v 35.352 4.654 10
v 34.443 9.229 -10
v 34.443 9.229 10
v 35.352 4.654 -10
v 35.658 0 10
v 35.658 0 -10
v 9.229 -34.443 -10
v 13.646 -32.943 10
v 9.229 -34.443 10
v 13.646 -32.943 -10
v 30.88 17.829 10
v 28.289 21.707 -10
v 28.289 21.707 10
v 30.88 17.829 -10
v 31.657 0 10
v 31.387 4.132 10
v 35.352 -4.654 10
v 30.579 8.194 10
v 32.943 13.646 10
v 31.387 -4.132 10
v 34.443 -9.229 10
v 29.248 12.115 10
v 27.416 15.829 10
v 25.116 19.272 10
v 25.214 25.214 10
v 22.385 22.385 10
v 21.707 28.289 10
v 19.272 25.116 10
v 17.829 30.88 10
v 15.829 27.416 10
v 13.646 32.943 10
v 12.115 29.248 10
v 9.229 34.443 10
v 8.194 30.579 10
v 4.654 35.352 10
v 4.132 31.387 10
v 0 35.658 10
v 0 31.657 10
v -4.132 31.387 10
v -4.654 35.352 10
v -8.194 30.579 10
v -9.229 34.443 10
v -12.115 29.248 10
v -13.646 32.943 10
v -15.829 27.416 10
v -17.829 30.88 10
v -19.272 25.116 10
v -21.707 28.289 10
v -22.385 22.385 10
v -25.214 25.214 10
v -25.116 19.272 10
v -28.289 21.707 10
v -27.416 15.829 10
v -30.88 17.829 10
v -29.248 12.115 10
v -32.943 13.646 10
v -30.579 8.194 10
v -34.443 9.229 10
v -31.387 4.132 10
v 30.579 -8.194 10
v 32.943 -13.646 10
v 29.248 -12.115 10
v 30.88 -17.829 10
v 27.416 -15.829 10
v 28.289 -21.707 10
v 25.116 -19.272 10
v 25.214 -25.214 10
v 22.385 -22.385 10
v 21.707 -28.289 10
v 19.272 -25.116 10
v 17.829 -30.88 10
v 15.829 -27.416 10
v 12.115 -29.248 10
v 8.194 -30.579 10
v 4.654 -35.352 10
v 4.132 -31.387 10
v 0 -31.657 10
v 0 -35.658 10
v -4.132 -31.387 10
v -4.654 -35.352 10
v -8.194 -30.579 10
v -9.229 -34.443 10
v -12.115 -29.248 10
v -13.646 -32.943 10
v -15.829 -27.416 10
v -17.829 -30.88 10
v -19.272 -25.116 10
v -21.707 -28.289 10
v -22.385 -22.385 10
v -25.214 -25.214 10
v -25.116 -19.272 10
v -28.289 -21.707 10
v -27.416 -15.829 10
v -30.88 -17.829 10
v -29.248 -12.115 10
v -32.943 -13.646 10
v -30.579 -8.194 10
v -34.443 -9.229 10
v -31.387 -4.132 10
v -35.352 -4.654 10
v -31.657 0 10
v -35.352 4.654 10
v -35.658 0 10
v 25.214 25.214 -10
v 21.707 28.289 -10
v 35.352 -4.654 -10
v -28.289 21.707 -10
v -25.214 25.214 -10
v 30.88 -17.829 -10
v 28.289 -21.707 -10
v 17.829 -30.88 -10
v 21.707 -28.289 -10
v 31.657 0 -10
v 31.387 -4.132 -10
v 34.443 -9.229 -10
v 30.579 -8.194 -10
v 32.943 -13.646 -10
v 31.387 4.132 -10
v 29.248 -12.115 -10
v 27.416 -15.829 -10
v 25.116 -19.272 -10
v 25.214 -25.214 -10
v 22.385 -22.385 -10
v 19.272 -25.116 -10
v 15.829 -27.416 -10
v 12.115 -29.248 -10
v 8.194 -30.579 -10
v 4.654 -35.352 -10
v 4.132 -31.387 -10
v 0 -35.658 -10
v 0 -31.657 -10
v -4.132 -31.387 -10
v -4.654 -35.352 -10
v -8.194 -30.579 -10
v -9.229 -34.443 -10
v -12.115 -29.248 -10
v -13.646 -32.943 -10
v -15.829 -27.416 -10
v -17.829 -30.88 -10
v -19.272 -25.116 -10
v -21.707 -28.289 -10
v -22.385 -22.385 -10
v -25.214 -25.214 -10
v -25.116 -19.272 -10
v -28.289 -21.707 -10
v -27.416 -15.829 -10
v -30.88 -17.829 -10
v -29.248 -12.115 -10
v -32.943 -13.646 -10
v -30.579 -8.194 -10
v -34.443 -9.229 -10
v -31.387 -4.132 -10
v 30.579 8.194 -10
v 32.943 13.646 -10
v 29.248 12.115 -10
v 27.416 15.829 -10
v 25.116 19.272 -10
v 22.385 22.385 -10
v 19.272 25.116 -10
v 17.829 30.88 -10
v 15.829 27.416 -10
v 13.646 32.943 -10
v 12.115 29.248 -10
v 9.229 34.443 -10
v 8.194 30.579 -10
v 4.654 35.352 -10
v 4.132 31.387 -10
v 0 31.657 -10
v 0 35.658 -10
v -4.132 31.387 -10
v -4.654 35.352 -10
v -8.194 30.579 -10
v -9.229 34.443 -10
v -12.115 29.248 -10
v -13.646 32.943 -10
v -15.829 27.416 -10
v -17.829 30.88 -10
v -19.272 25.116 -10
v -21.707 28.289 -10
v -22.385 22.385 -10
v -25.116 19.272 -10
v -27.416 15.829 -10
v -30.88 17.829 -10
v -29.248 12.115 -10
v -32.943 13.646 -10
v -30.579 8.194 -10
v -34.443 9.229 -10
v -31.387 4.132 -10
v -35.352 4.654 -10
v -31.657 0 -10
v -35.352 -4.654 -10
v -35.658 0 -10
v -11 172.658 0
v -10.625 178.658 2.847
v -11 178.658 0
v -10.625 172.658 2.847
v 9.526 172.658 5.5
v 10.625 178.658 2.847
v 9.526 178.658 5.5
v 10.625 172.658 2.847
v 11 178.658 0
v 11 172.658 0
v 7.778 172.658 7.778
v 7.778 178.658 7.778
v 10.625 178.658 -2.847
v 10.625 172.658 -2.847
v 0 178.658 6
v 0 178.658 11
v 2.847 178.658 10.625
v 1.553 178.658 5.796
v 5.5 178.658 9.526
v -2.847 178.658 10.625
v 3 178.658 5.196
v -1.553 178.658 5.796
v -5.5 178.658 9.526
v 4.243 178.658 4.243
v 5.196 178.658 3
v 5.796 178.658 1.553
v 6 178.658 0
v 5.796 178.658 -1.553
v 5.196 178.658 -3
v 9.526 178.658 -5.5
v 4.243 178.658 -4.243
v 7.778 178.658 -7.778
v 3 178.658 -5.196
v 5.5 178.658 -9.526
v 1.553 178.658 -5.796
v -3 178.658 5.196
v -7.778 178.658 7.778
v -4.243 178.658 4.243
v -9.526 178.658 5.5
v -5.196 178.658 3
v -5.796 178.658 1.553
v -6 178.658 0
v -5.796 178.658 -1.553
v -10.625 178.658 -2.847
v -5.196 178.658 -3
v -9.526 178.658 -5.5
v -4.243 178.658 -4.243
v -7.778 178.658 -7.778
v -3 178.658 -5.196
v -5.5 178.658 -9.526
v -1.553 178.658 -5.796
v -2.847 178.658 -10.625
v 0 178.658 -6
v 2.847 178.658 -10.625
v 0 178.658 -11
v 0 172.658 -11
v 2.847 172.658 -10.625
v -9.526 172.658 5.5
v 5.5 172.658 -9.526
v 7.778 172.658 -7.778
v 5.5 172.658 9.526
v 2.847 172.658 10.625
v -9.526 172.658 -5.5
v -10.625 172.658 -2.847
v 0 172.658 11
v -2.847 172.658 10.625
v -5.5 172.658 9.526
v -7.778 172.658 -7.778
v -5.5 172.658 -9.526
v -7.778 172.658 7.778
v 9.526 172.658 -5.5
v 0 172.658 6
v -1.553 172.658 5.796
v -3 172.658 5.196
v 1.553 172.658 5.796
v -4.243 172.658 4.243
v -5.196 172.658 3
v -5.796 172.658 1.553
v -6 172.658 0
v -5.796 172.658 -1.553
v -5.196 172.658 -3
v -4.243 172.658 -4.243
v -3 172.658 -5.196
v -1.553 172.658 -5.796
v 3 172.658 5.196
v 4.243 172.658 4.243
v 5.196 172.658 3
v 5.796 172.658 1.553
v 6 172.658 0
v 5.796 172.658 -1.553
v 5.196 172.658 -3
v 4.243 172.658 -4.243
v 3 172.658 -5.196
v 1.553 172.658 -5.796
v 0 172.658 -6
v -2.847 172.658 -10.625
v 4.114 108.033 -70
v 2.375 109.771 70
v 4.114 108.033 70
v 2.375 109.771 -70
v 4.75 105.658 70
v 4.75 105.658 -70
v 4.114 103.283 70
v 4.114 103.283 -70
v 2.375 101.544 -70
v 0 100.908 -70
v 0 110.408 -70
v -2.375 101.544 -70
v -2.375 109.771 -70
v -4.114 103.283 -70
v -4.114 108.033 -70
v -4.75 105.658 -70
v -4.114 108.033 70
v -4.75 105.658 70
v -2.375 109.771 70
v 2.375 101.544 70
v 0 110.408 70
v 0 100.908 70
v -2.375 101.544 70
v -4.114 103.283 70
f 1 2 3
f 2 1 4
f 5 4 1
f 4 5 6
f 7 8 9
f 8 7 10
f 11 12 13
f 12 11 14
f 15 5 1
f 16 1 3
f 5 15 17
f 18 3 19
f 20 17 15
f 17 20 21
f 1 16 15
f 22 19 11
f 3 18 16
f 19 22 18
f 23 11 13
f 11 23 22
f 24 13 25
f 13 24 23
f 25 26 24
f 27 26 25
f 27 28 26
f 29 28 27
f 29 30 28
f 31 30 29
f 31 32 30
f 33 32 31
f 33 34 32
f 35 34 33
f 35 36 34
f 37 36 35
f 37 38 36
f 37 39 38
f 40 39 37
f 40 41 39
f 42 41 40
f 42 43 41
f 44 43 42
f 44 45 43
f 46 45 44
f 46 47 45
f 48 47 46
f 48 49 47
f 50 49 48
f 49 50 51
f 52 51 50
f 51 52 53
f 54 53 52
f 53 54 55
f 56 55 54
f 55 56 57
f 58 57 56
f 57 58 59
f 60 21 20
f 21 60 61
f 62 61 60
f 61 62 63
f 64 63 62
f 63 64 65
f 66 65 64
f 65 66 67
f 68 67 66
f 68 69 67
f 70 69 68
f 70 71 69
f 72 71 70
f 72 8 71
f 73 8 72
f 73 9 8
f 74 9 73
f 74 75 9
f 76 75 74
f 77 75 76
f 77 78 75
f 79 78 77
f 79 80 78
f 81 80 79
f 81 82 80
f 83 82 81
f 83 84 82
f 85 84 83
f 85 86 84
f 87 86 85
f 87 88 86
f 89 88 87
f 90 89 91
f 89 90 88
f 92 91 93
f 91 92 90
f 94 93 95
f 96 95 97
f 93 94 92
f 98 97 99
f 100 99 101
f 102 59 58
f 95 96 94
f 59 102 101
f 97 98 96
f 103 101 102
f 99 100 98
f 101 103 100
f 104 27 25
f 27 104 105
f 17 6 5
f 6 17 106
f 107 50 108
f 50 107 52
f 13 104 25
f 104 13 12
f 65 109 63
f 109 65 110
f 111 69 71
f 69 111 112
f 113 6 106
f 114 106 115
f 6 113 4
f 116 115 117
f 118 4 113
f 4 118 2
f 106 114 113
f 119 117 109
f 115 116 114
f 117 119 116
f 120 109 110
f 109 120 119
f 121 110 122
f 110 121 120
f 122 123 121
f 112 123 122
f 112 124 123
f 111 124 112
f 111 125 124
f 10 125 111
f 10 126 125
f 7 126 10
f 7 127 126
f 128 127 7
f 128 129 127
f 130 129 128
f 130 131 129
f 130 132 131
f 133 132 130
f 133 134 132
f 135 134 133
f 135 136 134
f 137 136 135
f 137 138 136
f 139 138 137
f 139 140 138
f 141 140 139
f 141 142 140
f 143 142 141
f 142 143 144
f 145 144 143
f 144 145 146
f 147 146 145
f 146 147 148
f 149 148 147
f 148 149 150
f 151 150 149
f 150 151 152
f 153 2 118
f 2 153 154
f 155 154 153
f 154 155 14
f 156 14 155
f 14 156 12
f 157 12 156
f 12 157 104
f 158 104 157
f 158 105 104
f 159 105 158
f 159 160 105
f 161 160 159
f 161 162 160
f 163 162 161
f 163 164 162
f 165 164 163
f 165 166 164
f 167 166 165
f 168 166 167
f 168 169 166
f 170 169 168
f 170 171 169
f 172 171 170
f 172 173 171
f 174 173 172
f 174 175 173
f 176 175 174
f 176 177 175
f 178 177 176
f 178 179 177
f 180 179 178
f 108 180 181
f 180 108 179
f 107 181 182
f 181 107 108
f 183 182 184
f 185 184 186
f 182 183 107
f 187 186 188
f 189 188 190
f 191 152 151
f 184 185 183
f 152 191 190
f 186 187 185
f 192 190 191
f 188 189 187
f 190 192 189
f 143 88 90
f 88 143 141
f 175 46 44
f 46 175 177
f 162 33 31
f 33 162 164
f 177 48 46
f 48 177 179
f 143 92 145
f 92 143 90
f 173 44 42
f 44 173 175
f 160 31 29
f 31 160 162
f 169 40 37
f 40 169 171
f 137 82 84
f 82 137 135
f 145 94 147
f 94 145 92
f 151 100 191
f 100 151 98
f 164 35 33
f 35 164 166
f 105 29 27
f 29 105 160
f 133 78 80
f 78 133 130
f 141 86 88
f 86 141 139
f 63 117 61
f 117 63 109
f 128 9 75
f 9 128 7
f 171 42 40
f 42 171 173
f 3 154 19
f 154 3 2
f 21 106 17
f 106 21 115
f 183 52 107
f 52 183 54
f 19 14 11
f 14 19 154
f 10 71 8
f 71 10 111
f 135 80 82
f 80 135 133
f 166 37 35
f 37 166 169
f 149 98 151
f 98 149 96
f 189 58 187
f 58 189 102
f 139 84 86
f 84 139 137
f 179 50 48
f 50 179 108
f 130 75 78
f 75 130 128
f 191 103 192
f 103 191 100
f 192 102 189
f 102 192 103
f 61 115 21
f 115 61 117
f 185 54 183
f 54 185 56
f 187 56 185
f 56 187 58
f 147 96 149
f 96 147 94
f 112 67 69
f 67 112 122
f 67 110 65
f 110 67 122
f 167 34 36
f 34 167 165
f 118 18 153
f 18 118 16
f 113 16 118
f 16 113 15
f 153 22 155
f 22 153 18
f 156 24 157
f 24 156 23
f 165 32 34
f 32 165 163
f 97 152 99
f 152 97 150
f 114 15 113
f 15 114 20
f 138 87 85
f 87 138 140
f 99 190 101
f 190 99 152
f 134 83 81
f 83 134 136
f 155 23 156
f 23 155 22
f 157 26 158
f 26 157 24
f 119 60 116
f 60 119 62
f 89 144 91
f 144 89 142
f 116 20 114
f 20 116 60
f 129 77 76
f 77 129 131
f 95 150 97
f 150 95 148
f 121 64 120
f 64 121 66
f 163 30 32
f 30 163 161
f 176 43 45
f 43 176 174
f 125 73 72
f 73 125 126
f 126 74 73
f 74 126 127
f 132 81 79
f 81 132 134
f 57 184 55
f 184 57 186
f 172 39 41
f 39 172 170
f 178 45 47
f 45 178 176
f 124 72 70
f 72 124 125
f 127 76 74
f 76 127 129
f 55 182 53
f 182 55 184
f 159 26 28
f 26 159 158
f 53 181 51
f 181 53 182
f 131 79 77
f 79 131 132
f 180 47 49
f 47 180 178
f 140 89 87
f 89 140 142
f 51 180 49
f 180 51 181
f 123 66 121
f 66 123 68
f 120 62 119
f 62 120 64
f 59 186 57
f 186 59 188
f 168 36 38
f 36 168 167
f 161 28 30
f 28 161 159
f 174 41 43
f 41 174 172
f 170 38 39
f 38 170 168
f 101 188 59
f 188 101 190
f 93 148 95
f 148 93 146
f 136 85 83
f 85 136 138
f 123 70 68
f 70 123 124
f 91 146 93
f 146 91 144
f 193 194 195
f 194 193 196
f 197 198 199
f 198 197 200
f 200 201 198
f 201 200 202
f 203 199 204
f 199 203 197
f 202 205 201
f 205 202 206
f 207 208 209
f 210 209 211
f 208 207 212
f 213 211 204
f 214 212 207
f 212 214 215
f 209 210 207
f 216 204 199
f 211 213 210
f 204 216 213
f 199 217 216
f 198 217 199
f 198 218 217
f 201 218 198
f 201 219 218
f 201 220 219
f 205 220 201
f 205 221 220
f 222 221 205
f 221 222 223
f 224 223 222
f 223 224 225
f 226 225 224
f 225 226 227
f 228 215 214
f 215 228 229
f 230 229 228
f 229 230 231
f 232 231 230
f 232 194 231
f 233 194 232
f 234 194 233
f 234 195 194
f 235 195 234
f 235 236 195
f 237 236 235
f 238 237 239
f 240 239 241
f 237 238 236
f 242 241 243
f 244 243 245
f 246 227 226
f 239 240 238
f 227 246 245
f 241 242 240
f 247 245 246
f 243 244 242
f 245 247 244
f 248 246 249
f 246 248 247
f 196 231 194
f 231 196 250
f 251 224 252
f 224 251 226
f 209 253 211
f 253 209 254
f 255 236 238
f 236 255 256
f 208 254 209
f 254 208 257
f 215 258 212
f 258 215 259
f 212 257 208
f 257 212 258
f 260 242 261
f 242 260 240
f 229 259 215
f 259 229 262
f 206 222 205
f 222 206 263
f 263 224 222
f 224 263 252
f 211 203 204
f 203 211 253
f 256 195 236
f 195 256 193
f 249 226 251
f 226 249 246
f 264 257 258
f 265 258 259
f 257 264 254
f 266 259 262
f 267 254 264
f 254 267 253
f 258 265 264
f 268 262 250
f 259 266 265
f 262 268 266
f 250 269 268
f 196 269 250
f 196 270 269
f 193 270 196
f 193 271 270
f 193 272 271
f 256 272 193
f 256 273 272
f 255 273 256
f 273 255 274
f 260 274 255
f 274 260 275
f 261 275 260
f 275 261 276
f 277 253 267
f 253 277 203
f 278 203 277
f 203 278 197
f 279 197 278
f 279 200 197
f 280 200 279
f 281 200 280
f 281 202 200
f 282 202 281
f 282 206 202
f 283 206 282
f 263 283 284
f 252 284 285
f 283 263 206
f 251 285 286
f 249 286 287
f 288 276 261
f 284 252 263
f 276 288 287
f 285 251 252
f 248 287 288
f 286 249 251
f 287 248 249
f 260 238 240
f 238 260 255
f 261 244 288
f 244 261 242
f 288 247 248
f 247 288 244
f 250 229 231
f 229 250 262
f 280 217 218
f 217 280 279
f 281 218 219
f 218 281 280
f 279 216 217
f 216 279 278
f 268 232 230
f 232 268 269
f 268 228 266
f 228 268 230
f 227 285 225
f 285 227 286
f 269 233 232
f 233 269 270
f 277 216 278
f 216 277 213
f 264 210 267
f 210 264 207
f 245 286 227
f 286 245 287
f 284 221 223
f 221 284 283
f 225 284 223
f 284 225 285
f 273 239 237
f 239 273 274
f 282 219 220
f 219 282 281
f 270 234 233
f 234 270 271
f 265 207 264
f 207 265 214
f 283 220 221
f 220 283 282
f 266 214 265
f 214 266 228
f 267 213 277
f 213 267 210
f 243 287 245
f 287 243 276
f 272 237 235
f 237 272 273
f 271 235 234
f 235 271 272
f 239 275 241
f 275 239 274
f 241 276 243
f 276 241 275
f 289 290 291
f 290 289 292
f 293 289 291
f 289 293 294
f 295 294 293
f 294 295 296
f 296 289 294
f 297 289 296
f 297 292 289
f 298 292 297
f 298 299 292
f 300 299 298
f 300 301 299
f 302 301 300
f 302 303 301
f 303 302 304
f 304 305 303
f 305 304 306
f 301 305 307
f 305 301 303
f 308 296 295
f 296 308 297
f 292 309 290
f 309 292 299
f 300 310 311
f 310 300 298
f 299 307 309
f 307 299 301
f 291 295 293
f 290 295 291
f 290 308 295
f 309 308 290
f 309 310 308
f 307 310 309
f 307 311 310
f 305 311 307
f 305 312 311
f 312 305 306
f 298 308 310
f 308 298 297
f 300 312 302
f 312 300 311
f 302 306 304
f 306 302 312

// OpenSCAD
// Auto-generated by scripts/author_from_manifest.py (Phase D.3).
// Source: data/phase_d_manifest.json (sku_intent='anvil-fig1000-sway-brace-lateral').
// Do not hand-edit — regenerate from the manifest.
//
// @part anvil_fig1000_sway_brace_lateral
// @kind hanger
// @category brace.lateral
// @display-name "Anvil FIG 1000 Seismic Sway Brace — Lateral"
// @mfg anvil_international
// @mfg-pn FIG_1000_L
// @listing UL
// @price-usd 42.00
// @install-minutes 15
// @crew journeyman
// @param size_in number default=2 label="Size" unit="in"
// @port pipe position=[0,0,0] direction=[0,1,0] style=grooved size_in=2 role=run_a

size_in = 2.0;

function od_mm(nps) =
    nps ==   1  ? 33.4 :
    nps == 1.25 ? 42.2 :
    nps == 1.5  ? 48.3 :
    nps ==   2  ? 60.3 :
    nps == 2.5  ? 73.0 :
    nps ==   3  ? 88.9 :
    nps ==   4  ? 114.3 :
    nps ==   6  ? 168.3 :
    nps ==   8  ? 219.1 : 60.3;

od = od_mm(size_in);
ring_id = od * 1.05;
ring_od = ring_id + 8;
strap_w = 20;
rod_len = 140;

union() {
    // Ring
    difference() {
        cylinder(h = strap_w, d = ring_od, center = true, $fn = 48);
        cylinder(h = strap_w + 1, d = ring_id, center = true, $fn = 48);
    }
    // Rod up +Y
    translate([0, rod_len/2 + ring_od/2, 0])
        cylinder(h = rod_len, d = 9.5, center = true, $fn = 12);
    // Top swivel eye
    translate([0, rod_len + ring_od/2, 0])
        rotate([90, 0, 0])
        difference() {
            cylinder(h = 6, d = 22, center = true, $fn = 24);
            cylinder(h = 8, d = 12, center = true, $fn = 24);
        }
}
